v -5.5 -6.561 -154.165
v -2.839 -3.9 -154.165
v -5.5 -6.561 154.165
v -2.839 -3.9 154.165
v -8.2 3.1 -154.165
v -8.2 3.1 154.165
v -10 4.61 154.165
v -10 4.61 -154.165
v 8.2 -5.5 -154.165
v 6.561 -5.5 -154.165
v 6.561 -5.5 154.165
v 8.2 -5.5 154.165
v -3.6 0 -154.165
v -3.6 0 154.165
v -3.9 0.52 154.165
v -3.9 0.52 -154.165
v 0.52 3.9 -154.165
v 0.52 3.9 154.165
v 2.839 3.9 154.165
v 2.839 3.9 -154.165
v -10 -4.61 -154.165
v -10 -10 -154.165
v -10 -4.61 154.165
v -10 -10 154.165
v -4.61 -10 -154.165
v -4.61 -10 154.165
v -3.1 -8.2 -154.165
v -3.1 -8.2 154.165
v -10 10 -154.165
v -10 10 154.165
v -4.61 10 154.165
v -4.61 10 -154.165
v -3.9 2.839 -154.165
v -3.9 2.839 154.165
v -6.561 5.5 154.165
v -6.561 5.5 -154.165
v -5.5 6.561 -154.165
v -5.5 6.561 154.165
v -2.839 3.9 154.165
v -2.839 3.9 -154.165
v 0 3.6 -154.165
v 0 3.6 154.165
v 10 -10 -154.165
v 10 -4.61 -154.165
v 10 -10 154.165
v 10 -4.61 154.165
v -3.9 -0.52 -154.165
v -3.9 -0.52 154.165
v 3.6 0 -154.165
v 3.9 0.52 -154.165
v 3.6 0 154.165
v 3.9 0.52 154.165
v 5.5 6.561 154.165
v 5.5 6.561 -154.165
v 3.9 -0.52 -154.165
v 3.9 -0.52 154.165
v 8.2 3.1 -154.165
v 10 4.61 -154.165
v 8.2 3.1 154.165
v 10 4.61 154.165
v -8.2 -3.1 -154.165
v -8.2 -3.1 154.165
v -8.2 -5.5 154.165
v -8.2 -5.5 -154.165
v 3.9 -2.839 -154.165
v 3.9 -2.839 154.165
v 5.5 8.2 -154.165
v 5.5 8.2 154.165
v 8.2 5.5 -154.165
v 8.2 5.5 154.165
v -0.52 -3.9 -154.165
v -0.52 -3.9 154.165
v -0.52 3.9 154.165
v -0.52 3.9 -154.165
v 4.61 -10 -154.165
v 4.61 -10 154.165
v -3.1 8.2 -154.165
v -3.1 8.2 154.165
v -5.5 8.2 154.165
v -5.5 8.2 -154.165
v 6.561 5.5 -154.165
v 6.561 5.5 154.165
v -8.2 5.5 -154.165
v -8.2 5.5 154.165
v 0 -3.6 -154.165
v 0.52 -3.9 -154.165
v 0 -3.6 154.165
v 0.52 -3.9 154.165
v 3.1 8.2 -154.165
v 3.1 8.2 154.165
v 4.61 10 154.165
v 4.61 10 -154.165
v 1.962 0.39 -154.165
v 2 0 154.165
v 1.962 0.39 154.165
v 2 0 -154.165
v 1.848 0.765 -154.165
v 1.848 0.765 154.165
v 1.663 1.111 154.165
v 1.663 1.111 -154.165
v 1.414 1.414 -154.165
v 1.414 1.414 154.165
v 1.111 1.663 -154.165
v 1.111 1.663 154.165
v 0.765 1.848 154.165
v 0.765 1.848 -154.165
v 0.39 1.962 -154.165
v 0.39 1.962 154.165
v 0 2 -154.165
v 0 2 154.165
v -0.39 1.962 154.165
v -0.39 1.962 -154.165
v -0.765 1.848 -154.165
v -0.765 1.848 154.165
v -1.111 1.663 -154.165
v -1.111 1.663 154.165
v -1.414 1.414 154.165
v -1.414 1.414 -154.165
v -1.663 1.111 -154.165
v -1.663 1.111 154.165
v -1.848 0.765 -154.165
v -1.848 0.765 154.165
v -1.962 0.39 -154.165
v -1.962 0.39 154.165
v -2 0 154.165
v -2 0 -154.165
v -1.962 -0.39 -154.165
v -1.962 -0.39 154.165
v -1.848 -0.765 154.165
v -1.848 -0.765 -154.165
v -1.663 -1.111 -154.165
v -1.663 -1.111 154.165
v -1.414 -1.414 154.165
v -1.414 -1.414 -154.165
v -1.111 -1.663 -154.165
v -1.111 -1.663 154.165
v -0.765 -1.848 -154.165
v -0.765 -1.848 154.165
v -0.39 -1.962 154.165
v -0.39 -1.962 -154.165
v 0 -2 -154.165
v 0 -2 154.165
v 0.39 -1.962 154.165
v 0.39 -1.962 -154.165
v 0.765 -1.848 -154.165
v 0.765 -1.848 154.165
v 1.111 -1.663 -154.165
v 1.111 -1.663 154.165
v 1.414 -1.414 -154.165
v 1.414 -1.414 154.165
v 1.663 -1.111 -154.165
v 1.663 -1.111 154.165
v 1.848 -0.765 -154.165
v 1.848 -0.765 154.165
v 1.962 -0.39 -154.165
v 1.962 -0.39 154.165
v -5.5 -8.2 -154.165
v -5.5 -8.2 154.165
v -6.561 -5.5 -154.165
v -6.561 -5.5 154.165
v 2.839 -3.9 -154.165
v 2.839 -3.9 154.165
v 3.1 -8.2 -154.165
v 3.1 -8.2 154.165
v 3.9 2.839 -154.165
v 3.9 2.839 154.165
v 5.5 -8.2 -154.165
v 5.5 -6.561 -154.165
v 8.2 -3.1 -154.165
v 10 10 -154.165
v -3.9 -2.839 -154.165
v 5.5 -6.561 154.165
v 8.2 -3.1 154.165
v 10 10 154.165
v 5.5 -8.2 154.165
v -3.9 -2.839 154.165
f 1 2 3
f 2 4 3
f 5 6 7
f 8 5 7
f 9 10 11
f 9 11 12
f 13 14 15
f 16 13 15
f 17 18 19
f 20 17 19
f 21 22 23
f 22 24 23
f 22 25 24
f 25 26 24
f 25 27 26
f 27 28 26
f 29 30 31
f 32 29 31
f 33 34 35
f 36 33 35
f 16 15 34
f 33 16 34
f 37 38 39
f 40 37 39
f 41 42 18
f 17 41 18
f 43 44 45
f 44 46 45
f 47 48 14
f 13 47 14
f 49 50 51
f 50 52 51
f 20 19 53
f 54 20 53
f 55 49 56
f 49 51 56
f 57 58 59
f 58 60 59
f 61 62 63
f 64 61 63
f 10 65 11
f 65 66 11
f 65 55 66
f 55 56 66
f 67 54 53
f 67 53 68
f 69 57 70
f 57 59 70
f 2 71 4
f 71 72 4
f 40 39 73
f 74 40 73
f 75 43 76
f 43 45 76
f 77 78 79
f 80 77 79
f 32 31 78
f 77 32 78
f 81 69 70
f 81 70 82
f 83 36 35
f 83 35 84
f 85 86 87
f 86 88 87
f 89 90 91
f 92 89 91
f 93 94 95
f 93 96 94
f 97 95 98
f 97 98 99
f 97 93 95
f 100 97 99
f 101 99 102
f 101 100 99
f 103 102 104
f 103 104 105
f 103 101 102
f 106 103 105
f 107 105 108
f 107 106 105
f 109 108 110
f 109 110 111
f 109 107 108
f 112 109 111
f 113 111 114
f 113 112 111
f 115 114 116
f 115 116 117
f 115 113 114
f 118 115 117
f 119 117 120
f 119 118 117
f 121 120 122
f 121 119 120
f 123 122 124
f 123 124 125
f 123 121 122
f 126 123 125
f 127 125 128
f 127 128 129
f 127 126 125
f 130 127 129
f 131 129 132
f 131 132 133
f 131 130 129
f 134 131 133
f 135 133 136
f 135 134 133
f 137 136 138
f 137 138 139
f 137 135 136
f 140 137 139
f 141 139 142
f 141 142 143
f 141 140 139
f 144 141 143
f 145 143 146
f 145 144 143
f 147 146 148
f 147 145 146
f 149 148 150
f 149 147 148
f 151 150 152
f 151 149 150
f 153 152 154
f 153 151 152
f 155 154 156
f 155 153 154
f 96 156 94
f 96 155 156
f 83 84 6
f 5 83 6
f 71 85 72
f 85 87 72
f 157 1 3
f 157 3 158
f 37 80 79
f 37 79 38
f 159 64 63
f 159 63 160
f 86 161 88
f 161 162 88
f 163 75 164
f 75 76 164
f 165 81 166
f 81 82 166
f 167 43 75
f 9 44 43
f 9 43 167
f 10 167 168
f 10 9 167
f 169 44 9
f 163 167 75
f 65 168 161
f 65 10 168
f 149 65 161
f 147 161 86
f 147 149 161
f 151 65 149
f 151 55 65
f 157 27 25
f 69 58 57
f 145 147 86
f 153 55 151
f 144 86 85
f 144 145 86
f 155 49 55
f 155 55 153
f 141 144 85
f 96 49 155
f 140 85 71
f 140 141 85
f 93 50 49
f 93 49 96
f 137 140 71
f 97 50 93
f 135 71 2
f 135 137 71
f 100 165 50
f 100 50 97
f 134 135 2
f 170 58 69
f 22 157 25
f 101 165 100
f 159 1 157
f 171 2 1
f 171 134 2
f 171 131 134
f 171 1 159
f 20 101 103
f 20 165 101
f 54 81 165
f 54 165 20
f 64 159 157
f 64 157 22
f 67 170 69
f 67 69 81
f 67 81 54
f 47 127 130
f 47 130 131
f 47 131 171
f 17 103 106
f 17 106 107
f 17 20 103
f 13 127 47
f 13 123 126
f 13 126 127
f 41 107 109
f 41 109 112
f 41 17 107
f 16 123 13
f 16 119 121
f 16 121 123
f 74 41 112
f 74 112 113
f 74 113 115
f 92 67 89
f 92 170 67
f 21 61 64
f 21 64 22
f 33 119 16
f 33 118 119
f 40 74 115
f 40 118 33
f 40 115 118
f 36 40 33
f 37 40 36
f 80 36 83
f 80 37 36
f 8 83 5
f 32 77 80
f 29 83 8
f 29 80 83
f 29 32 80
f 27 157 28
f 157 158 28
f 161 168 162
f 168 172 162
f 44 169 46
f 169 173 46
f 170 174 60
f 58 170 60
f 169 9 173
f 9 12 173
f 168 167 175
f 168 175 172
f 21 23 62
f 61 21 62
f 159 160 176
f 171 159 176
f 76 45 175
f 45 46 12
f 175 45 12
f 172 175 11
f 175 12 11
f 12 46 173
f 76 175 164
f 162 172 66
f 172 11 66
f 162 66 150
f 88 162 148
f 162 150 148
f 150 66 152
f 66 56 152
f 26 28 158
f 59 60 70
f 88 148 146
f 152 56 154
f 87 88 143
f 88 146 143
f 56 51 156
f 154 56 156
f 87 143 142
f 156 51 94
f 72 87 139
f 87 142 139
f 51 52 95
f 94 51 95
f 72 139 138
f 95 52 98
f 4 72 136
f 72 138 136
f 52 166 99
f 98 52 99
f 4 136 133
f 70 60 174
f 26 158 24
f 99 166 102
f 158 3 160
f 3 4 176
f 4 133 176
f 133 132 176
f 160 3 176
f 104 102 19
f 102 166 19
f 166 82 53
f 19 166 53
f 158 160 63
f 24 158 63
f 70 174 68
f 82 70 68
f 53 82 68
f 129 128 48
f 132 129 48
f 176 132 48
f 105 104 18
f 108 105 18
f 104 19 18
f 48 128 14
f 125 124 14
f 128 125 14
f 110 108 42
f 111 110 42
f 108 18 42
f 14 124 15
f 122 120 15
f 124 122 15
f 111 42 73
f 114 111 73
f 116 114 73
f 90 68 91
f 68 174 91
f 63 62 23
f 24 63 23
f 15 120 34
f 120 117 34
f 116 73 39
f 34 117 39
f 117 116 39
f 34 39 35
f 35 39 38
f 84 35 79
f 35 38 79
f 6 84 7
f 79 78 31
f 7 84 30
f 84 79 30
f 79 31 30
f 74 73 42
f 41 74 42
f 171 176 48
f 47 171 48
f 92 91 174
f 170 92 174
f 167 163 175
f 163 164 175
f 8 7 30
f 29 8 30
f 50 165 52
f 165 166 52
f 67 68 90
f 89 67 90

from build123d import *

# Parameters (mm, degrees)
SKETCH1_R           = 2
BOSS_EXTRUDE1_DEPTH = 154.165


with BuildPart() as part:
    # Sketch1 → Boss-Extrude1 (new body, symmetric)
    with BuildSketch(Plane.XY):
        Polygon((10, 10), (10, 4.610379336), (8.2, 3.1), (8.2, 5.5), (6.560660172, 5.5), (3.9, 2.839339828), (3.9, 0.519615242), (3.6, 0), (3.9, -0.519615242), (3.9, -2.839339828), (6.560660172, -5.5), (8.2, -5.5), (8.2, -3.1), (10, -4.610379336), (10, -10), (4.610379336, -10), (3.1, -8.2), (5.5, -8.2), (5.5, -6.560660172), (2.839339828, -3.9), (0.519615242, -3.9), (0, -3.6), (-0.519615242, -3.9), (-2.839339828, -3.9), (-5.5, -6.560660172), (-5.5, -8.2), (-3.1, -8.2), (-4.610379336, -10), (-10, -10), (-10, -4.610379336), (-8.2, -3.1), (-8.2, -5.5), (-6.560660172, -5.5), (-3.9, -2.839339828), (-3.9, -0.519615242), (-3.6, 0), (-3.9, 0.519615242), (-3.9, 2.839339828), (-6.560660172, 5.5), (-8.2, 5.5), (-8.2, 3.1), (-10, 4.610379336), (-10, 10), (-4.610379336, 10), (-3.1, 8.2), (-5.5, 8.2), (-5.5, 6.560660172), (-2.839339828, 3.9), (-0.519615242, 3.9), (0, 3.6), (0.519615242, 3.9), (2.839339828, 3.9), (5.5, 6.560660172), (5.5, 8.2), (3.1, 8.2), (4.610379336, 10), align=None)
        Circle(SKETCH1_R, mode=Mode.SUBTRACT)
    extrude(amount=BOSS_EXTRUDE1_DEPTH, both=True)


solid = part.part
